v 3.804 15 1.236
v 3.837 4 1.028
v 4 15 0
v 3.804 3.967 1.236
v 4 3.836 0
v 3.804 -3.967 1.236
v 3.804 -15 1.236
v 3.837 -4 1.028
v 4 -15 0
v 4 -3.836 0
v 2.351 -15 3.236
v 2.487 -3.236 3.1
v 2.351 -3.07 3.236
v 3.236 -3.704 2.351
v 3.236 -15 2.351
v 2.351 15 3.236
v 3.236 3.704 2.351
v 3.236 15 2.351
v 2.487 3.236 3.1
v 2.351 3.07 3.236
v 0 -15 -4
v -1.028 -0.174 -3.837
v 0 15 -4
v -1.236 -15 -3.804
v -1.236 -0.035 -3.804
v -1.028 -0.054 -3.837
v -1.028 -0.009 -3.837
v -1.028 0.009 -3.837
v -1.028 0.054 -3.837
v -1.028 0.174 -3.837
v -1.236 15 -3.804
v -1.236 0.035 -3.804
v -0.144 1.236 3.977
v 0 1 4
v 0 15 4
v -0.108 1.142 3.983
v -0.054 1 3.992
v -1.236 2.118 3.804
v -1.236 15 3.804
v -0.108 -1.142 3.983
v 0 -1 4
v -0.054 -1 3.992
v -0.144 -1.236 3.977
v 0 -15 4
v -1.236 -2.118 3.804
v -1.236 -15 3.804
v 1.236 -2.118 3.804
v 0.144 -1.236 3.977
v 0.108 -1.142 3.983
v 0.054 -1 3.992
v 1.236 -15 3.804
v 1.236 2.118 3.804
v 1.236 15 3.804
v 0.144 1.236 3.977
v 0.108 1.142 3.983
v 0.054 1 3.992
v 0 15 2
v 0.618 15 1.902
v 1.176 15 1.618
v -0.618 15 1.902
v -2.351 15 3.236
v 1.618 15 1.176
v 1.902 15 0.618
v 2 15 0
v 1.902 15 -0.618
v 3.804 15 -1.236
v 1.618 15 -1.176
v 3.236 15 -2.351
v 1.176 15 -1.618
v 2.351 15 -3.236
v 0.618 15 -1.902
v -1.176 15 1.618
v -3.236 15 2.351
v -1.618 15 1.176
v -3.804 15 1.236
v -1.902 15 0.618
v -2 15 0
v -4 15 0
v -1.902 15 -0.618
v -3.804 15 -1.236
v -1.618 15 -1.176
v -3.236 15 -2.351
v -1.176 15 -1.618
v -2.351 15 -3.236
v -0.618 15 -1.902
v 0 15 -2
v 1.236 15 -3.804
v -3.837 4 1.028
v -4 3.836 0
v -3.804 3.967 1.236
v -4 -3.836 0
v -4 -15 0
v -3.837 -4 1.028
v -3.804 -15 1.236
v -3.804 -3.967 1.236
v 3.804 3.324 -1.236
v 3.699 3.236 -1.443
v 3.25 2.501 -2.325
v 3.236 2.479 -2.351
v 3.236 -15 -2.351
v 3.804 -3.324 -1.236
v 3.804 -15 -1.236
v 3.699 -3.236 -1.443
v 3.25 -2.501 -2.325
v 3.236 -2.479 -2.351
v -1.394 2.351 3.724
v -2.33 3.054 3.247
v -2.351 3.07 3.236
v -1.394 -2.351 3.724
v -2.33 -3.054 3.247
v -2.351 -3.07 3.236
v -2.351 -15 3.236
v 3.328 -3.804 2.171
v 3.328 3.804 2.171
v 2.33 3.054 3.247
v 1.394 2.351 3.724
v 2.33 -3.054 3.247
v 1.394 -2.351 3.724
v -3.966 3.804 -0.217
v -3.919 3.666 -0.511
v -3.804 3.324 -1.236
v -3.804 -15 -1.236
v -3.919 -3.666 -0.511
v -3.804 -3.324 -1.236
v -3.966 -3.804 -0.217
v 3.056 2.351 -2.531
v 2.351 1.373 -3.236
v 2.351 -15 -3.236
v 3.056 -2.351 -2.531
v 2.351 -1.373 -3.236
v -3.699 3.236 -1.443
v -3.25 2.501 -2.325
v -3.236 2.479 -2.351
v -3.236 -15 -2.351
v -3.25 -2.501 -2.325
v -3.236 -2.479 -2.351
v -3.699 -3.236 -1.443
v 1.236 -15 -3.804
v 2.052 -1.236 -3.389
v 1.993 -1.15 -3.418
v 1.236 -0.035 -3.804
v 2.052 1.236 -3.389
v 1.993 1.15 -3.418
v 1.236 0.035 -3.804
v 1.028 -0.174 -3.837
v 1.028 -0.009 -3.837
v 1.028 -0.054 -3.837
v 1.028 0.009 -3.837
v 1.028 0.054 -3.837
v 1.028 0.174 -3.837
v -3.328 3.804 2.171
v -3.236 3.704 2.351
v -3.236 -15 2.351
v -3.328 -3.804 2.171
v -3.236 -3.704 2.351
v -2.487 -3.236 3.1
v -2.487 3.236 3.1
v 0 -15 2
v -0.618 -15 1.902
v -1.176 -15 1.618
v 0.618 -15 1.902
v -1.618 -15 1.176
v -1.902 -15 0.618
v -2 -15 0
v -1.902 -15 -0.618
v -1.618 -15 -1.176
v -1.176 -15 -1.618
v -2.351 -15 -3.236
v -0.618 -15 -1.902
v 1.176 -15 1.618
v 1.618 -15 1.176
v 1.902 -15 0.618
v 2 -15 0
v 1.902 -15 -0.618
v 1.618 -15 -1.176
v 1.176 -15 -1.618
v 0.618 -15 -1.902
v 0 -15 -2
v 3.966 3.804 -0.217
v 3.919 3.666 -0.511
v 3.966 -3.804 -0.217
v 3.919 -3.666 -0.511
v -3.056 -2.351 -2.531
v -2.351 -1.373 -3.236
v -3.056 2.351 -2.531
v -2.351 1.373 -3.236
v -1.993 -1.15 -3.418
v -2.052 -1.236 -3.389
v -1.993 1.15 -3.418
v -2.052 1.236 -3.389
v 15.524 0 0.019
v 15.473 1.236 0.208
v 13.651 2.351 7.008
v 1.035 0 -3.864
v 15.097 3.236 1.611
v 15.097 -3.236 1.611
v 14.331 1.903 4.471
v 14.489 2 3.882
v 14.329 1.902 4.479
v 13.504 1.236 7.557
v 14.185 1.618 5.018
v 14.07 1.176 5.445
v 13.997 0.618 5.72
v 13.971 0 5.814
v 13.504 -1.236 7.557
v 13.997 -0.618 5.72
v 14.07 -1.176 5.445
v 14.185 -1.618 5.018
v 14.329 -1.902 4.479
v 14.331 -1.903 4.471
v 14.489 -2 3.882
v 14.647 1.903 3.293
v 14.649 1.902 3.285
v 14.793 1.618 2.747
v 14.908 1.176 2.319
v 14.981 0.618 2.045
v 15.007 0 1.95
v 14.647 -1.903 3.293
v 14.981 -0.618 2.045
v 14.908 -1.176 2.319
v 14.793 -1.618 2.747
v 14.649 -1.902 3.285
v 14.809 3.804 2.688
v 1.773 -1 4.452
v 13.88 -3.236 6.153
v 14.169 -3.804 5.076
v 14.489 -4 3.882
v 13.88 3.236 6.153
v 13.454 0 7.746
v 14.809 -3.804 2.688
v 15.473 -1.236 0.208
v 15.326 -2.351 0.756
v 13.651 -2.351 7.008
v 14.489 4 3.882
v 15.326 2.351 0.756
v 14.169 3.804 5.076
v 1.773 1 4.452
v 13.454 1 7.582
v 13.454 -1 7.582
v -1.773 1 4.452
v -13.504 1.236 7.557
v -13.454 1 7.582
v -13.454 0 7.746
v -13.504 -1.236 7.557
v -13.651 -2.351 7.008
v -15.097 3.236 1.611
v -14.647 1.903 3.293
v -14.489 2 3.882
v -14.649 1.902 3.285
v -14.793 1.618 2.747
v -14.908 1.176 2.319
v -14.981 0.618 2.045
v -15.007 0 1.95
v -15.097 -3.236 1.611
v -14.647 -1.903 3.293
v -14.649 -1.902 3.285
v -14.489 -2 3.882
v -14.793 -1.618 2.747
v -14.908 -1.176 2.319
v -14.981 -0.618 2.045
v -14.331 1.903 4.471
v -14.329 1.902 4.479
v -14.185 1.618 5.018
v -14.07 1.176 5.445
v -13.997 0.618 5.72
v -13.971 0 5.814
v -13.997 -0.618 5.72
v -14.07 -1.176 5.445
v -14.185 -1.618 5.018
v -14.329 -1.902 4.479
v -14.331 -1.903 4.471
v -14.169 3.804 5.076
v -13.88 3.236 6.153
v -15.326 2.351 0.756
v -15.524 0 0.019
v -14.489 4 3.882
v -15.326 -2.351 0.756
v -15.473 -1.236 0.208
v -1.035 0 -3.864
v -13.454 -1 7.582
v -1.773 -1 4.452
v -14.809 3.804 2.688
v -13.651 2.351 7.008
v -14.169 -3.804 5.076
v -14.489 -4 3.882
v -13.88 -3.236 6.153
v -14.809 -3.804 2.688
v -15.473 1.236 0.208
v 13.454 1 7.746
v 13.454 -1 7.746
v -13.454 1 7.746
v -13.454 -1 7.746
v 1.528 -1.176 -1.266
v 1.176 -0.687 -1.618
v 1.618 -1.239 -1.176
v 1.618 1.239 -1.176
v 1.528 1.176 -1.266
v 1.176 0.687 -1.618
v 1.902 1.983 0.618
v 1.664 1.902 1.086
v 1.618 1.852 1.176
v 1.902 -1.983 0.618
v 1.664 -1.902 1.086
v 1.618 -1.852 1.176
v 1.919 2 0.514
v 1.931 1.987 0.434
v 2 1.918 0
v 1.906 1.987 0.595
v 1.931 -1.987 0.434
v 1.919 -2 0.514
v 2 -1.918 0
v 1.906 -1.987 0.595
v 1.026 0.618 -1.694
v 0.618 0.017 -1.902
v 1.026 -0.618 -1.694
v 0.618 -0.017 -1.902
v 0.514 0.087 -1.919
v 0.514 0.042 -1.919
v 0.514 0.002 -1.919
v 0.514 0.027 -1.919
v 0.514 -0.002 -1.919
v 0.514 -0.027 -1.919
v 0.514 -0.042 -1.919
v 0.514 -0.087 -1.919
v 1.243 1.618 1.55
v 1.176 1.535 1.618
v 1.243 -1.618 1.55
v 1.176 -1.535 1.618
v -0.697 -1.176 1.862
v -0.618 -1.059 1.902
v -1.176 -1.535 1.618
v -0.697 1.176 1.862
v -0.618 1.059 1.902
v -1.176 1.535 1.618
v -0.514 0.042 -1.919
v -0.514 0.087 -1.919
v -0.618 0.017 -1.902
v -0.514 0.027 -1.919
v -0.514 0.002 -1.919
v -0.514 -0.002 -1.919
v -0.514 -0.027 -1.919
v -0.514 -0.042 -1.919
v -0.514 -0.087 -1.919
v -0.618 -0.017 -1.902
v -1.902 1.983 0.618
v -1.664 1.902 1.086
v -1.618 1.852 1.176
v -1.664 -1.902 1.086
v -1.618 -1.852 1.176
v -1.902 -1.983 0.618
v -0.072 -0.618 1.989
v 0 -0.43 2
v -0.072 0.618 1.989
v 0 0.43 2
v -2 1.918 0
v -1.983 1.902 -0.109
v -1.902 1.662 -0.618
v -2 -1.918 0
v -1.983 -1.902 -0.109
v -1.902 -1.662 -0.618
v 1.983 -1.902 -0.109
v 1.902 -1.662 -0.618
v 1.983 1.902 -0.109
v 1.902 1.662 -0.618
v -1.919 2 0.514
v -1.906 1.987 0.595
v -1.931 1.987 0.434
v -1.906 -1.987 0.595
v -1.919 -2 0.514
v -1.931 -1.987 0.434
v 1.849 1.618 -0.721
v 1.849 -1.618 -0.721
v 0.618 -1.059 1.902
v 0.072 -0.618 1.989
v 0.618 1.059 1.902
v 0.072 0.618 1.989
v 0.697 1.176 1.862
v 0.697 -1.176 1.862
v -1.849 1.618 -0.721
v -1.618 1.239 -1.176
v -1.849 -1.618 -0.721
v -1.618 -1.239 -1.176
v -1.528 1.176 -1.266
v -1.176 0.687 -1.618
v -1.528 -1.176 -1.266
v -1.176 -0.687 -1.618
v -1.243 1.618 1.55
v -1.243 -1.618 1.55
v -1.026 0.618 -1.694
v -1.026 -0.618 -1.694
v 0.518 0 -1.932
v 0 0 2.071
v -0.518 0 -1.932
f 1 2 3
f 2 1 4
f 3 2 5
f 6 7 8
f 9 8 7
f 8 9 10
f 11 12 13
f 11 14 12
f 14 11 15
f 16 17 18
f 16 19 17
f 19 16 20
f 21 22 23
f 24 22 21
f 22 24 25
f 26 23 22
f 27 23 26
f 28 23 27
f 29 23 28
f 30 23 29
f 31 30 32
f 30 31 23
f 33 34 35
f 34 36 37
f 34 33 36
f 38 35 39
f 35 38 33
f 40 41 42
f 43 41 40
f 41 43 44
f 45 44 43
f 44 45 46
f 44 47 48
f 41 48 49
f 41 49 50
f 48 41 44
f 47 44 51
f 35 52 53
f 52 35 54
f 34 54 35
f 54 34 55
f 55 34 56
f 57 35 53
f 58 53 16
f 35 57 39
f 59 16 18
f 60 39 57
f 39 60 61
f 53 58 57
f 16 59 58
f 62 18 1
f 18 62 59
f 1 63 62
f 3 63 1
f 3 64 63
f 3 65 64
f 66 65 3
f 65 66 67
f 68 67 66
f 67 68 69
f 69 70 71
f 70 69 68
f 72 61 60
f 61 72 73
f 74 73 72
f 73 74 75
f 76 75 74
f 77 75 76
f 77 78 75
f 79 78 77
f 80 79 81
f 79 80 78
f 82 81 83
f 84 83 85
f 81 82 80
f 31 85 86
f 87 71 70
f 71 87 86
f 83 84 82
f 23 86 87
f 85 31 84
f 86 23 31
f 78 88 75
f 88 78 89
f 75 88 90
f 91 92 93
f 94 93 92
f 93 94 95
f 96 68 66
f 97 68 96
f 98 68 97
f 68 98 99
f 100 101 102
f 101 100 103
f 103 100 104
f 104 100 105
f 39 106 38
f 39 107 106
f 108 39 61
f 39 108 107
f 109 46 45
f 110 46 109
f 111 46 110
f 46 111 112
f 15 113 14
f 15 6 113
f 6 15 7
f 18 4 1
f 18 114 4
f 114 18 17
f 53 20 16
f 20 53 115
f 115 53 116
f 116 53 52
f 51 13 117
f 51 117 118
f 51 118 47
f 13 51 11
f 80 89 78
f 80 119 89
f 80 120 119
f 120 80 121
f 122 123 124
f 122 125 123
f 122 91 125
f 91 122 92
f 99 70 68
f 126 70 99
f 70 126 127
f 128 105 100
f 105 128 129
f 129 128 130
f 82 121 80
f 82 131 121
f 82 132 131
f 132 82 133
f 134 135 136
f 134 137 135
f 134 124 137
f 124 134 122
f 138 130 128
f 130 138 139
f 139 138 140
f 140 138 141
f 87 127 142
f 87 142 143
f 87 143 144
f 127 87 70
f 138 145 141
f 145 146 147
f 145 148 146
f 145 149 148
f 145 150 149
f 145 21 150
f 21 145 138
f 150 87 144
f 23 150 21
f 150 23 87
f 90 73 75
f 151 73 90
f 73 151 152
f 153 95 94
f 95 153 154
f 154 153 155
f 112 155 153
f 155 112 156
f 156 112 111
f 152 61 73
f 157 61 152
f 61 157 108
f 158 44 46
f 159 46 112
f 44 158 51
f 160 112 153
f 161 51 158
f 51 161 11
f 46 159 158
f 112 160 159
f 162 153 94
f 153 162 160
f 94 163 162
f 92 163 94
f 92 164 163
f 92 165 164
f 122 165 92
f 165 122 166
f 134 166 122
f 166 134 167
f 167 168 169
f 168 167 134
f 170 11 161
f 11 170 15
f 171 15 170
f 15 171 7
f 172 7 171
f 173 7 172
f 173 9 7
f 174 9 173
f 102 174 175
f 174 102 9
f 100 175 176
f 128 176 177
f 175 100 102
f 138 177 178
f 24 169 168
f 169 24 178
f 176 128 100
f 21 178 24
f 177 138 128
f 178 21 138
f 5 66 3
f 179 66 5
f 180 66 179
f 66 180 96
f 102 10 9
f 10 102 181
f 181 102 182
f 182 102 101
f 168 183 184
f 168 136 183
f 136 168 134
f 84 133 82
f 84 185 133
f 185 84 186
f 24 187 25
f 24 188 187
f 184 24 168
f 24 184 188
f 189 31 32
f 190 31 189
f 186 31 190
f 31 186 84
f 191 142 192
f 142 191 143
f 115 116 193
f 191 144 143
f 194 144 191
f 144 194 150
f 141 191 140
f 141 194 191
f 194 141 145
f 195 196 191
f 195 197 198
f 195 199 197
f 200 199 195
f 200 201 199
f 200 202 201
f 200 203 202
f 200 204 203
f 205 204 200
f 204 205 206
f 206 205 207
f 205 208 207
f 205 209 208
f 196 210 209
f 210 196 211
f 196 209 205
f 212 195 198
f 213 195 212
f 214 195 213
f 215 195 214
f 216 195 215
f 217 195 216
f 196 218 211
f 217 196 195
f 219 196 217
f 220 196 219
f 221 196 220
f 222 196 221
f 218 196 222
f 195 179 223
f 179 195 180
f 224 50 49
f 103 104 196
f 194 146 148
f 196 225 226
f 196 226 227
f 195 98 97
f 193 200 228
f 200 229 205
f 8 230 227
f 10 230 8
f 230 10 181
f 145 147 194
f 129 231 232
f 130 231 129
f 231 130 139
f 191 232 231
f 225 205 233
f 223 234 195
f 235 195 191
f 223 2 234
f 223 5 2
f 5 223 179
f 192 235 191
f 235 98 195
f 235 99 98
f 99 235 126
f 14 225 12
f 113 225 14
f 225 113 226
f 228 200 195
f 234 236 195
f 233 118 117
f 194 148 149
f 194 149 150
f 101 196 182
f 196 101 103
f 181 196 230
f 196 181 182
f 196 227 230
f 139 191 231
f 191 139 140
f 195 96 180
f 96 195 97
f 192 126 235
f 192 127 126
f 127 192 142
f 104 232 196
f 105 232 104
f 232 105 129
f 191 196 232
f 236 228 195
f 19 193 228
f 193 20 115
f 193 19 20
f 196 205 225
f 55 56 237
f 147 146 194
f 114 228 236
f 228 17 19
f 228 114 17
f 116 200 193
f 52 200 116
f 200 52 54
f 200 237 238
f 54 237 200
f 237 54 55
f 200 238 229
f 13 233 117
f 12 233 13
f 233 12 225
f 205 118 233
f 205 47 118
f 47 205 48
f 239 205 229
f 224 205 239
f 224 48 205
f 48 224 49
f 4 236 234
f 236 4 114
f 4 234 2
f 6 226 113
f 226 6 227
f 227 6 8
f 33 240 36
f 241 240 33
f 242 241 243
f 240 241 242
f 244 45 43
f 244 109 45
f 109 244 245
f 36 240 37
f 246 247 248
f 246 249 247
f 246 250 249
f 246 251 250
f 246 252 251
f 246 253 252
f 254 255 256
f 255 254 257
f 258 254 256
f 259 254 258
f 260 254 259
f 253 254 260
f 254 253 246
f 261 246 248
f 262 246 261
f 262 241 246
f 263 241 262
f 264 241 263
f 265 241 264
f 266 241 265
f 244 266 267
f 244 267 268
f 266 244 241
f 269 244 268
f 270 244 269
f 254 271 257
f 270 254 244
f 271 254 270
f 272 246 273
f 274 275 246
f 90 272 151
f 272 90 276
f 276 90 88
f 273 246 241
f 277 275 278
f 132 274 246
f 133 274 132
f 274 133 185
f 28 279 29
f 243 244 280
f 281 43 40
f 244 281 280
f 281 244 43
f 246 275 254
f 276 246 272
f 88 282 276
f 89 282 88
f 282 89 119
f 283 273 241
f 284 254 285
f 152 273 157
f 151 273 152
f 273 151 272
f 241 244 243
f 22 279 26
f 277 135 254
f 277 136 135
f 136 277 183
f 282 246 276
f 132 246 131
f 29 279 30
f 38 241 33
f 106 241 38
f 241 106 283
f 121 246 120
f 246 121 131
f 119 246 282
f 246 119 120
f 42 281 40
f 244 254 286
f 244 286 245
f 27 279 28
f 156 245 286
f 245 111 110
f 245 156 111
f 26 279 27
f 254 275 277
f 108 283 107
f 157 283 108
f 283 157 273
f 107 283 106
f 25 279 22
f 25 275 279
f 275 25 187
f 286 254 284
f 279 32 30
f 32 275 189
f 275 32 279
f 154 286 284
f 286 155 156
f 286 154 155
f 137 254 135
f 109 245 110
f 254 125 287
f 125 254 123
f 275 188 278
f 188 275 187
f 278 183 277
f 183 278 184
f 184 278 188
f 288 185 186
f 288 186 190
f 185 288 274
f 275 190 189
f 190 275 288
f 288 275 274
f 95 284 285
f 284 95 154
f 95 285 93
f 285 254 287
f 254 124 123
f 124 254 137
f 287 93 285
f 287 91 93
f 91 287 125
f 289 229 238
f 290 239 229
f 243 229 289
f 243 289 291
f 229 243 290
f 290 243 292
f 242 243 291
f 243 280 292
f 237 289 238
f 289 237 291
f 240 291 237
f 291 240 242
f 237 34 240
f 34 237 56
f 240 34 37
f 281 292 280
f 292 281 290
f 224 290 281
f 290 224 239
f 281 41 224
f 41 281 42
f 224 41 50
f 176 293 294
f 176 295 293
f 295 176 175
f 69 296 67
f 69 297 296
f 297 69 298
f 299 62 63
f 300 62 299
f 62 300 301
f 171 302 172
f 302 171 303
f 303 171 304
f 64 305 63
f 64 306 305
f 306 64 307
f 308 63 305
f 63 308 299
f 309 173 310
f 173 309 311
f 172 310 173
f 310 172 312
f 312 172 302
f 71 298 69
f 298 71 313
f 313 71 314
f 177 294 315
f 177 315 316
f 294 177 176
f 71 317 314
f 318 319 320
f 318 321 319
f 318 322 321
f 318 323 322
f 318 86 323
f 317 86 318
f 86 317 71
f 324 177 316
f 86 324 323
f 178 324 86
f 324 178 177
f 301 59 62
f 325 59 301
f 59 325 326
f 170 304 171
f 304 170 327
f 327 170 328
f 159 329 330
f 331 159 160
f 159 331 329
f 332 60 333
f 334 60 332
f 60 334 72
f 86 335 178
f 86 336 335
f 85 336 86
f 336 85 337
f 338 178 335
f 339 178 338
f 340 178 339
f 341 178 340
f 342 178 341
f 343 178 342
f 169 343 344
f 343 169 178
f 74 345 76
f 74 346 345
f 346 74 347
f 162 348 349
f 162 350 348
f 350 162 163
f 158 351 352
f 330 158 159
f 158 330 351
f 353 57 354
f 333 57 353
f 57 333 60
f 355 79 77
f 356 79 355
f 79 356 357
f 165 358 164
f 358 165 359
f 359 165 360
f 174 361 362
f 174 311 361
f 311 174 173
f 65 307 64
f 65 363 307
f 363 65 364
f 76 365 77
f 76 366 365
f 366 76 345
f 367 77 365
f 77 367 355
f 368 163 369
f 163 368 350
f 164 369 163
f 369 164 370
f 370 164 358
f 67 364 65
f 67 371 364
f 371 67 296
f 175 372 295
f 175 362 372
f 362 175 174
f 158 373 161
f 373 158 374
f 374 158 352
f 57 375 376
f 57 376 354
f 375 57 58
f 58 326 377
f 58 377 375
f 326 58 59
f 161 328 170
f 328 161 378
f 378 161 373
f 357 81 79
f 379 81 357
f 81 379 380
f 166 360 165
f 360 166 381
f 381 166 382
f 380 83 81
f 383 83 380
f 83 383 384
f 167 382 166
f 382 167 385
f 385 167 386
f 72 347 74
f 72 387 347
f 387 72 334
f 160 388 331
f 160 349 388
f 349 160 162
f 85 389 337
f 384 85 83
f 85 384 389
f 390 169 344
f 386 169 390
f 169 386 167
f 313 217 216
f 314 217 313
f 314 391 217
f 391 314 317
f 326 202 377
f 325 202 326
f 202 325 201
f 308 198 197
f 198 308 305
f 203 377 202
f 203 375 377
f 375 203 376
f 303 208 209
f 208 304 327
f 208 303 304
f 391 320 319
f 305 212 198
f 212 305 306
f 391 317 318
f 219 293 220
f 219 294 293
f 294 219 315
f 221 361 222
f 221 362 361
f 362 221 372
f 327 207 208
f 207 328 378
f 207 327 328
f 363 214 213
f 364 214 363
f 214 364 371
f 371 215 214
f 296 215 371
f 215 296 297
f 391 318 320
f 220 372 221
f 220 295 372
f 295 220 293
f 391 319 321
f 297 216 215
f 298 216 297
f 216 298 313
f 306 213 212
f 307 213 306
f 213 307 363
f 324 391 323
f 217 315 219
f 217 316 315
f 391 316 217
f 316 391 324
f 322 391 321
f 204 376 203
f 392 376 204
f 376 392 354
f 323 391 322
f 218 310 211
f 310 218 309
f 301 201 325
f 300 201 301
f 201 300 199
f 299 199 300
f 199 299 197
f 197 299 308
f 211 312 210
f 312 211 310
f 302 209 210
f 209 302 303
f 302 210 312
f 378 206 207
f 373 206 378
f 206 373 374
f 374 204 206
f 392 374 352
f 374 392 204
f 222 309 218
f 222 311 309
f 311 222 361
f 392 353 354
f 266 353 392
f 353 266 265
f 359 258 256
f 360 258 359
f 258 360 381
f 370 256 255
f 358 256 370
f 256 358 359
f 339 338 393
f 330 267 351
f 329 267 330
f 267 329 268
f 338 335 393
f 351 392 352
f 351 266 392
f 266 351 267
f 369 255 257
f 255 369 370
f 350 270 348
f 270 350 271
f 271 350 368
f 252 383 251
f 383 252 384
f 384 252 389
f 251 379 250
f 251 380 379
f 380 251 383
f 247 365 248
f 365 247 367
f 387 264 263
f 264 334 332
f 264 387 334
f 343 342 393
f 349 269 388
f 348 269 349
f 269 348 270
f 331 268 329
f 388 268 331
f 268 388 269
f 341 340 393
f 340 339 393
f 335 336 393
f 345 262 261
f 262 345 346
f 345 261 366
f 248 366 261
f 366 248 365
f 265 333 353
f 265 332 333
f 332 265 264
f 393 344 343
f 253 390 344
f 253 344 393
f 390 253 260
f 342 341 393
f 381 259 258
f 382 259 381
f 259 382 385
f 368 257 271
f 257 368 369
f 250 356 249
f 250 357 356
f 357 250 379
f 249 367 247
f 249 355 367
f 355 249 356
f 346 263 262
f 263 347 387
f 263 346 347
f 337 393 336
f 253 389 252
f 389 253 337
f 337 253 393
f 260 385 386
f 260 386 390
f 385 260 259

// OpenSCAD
// Parametric dihedral connector for a diamond kite. Adjustable for different rod
// diameters and angles.
//
// Michael Ang
// http://michaelang.com
//
// For further work, please see my Polygon Construction Kit (Polycon)
// http://www.michaelang.com/project/polycon
//
// This file is licensed under Creative Commons Attribution-NonCommercial-ShareAlike 
// CC BY-NC-SA
// http://creativecommons.org/licenses/by-nc-sa/4.0/

// Circle smoothness
$fn = 20;

/* [Global] */

// Dihedral angle, degrees up from horizontal
angle = 15;

// Length of the connector tubes
tube_length = 15;

// Width of your rod (adjust to get a tight fit)
inner_diameter = 4;

// Thickness of walls
wall_thickness = 2;

/* [Hidden] */
cut_overlap = 0.2;  // Pieces to be cut out need to go past what they're cutting

inner_radius = inner_diameter / 2;
outer_radius = inner_radius + wall_thickness;

// Create a completely solid version of the connector.
// We'll cut (difference) out the holes from the connector later.
module outer_tubes() {
	rotate([90,0,0]) {
		cylinder(r = outer_radius, h = tube_length * 2, center = true);
	}

	rotate([0,90-angle,0]) {
		cylinder(r = outer_radius, h = tube_length);
	}

	rotate([0,-(90-angle),0]) {
		cylinder(r = outer_radius, h = tube_length);
	}
}

// Create the shape that we'll cut out to make space for the rods to come into
// the connector.
module inner_tubes() {
	rotate([90,0,0]) {
		cylinder(r = inner_radius, h = tube_length * 2 + cut_overlap, center = true);
	}

	rotate([0,90-angle,0]) {
		cylinder(r = inner_radius, h = tube_length + cut_overlap);
	}

	rotate([0,-(90-angle),0]) {
		cylinder(r = inner_radius, h = tube_length + cut_overlap);
	}
}

// Use some math to make a solid brace between the angled tubes to
// make the connector stronger.
module dihedral_support(angle, inner_diameter, wall_thickness, tube_length)
{
	// Point at center of tube opening
	right_tube_center = [tube_length * cos(angle), 0, tube_length * sin(angle)];

	// Find top-right point
	outer_radius = inner_diameter / 2 + wall_thickness;
	offset_to_top_right = [-outer_radius * sin(angle), 0, outer_radius * cos(angle)];

	right_endpoint = right_tube_center + offset_to_top_right;

	width = right_endpoint[0] * 2;
	height = right_endpoint[2] - (outer_radius - 0.1);
	depth = wall_thickness;

	translate([-width/2,-depth/2,right_endpoint[2] - height]) {
		cube(size=[width, depth, height]);
	}
}

// Make the connector
difference() {
	union() {
		// Create a solid version of the connector by adding the tubes and the dihedral
	   // support.
		outer_tubes();
		dihedral_support(angle, inner_diameter, wall_thickness, tube_length);
	}
	// Subtract out the holes for the rods
	inner_tubes();
}
